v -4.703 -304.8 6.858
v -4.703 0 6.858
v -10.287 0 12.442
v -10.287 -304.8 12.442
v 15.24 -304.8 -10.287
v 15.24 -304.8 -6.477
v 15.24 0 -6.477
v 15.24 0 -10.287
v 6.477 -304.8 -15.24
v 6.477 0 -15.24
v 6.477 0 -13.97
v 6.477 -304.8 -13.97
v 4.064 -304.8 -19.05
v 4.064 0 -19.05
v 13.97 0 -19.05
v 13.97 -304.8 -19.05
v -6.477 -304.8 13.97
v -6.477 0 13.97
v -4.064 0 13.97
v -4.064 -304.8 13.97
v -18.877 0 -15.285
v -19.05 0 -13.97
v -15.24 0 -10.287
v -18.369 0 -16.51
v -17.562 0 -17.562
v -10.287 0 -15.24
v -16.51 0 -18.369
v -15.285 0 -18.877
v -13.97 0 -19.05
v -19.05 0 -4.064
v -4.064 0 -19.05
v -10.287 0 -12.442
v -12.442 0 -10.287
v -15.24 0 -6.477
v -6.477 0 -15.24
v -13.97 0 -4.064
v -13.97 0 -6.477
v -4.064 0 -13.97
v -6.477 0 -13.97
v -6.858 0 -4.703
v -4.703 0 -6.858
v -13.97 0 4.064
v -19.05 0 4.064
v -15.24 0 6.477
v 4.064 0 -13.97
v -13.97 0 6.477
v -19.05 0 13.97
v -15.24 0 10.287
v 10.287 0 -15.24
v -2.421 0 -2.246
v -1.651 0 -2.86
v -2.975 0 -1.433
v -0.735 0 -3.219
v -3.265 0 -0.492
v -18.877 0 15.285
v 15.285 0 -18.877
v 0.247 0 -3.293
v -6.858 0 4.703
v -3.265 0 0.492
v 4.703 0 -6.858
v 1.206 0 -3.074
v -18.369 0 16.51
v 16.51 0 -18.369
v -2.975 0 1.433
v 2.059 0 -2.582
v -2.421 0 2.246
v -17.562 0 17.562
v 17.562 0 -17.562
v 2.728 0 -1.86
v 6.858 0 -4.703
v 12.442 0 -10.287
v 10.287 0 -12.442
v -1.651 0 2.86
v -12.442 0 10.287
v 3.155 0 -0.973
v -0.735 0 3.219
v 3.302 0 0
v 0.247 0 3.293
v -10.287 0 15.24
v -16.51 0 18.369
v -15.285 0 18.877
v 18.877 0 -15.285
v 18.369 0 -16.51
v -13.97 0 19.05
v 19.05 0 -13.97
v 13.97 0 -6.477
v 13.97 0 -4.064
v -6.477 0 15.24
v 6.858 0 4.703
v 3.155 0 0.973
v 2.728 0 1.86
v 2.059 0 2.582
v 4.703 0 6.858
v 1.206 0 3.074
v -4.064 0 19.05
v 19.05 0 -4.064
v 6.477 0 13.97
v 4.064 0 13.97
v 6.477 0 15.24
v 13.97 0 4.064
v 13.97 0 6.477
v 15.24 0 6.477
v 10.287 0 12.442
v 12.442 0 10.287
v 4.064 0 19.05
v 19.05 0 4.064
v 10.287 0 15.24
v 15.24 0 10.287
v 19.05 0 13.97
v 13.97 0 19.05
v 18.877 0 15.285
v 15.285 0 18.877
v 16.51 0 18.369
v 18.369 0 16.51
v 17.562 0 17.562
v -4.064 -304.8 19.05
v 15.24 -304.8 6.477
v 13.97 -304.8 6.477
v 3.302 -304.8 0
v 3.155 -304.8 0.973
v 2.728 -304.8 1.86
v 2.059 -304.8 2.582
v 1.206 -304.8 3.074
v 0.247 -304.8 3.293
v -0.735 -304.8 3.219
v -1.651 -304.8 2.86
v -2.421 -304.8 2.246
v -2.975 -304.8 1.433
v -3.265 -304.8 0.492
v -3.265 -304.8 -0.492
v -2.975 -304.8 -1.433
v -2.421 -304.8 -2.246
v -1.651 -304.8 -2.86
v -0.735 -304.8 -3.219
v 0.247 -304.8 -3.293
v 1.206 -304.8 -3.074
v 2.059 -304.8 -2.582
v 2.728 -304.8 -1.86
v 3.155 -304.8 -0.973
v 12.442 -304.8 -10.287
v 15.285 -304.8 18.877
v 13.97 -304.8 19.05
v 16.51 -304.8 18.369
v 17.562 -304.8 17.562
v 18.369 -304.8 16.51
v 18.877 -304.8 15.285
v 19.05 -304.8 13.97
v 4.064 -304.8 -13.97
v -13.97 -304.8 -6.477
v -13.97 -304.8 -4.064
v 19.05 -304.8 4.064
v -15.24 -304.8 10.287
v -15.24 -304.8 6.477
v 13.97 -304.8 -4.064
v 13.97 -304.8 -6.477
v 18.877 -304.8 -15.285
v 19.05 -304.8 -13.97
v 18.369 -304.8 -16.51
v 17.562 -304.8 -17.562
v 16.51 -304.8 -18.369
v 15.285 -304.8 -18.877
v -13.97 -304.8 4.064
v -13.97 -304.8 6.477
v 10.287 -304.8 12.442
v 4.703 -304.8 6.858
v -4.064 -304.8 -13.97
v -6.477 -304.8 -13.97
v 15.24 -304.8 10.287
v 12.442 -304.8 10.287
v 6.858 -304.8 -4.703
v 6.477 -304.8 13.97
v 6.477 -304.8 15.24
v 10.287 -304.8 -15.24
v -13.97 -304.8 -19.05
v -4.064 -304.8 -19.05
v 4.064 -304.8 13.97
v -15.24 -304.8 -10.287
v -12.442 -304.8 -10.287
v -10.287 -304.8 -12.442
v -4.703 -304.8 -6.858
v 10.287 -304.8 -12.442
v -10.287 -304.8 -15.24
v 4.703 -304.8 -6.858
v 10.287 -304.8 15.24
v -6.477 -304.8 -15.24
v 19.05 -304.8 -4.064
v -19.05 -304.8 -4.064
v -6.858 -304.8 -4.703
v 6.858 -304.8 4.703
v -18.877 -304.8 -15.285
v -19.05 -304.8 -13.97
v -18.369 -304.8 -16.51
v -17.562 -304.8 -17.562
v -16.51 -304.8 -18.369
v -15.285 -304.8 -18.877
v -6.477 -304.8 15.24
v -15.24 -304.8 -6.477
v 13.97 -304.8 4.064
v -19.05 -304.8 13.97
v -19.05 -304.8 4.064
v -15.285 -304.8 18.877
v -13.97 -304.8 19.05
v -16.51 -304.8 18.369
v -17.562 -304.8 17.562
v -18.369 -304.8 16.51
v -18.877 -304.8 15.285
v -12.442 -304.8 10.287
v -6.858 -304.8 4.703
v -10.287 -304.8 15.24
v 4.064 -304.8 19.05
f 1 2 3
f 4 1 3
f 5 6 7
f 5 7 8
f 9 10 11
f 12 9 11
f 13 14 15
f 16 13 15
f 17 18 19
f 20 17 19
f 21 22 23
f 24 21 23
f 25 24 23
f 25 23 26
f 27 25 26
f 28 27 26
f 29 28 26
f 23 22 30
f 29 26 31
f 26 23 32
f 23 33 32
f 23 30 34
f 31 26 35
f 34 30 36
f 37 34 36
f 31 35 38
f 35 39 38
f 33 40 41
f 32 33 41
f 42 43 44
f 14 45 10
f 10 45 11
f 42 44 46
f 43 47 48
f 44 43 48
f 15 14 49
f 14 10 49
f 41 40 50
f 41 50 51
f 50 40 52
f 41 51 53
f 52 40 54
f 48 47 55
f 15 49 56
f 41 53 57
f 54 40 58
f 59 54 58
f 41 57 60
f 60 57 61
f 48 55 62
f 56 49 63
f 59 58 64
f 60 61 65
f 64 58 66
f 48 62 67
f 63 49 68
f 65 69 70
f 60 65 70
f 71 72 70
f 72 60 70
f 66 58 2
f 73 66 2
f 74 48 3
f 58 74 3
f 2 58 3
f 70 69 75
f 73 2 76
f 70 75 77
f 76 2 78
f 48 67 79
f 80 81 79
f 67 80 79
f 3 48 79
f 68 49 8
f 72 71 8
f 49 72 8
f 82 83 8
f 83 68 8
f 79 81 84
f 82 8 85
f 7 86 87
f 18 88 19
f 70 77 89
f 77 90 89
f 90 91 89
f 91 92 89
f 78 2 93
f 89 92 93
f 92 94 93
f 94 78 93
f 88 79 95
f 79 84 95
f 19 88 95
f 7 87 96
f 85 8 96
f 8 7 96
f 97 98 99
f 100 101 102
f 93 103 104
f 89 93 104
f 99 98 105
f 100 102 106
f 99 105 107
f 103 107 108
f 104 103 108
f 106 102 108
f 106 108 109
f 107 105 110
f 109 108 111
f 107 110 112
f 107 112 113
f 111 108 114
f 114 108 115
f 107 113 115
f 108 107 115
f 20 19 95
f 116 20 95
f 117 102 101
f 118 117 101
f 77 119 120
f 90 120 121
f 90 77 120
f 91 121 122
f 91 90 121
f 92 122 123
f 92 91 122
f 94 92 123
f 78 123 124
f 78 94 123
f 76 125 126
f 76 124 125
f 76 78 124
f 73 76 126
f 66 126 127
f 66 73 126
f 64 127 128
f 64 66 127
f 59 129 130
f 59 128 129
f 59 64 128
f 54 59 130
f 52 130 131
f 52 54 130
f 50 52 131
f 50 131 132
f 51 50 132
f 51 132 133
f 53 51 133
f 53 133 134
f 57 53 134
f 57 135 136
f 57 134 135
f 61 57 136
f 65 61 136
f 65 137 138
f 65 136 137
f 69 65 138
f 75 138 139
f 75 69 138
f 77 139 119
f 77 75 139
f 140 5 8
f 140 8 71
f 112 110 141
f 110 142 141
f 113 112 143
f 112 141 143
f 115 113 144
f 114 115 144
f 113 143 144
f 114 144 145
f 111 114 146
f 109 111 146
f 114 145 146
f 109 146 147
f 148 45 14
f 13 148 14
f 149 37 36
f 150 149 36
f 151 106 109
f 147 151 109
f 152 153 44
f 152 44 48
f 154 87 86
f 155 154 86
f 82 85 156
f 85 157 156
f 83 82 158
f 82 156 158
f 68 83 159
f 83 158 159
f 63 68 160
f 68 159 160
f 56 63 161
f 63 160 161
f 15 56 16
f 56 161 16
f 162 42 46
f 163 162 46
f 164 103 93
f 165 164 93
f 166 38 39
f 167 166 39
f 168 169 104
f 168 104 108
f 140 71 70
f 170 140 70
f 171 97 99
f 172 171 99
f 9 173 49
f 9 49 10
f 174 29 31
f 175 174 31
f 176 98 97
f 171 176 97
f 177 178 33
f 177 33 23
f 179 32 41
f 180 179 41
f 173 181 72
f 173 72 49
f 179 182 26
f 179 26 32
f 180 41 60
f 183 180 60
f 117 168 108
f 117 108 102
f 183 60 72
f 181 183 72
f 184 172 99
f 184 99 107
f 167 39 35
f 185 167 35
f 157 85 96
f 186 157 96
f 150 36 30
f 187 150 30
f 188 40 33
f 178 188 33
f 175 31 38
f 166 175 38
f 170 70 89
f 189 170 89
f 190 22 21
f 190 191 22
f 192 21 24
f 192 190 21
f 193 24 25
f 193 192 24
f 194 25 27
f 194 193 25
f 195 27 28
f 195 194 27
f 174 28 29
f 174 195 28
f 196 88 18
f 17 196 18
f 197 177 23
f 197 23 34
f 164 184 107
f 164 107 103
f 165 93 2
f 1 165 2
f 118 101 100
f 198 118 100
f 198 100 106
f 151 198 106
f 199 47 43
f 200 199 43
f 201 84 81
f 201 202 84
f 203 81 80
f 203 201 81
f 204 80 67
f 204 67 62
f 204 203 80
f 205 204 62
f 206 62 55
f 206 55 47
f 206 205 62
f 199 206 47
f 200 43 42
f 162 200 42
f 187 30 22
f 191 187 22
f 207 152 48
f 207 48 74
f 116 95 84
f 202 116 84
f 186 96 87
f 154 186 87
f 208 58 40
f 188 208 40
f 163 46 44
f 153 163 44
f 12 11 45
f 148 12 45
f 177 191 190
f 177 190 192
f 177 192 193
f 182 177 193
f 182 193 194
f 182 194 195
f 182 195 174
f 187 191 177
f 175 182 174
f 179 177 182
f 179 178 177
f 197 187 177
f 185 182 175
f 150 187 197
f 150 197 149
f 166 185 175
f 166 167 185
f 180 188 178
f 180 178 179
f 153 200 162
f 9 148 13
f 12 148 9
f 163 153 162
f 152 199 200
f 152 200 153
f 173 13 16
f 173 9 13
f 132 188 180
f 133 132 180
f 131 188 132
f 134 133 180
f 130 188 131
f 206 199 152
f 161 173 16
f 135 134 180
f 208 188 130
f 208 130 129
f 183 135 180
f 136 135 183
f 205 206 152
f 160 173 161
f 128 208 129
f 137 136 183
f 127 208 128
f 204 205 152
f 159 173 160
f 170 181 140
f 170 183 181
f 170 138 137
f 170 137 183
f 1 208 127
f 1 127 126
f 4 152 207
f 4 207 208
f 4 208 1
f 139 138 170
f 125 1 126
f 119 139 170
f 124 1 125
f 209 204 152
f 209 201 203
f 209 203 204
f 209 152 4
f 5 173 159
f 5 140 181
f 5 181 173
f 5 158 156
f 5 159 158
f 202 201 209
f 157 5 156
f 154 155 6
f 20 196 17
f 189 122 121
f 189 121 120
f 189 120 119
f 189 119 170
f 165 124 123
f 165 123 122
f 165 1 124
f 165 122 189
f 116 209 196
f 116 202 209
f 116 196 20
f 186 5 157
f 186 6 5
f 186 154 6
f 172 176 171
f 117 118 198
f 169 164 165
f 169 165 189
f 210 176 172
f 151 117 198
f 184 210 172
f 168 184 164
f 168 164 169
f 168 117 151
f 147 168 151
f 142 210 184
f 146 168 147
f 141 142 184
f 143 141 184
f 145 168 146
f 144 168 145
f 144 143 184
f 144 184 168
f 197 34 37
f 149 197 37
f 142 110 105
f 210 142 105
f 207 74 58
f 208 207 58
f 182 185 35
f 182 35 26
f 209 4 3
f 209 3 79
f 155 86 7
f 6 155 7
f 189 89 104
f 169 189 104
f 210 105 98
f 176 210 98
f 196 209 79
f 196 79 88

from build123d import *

# Parameters (mm, degrees)
F3_DEPTH = 304.8
F2_R     = 3.302
F4_DEPTH = 304.801
F5_R     = 5.08


with BuildPart() as f3:
    # F1 (on Front) → F3 (new body)
    with BuildSketch(Plane.XZ):
        Polygon((19.05, 19.05), (4.064, 19.05), (4.064, 13.97), (6.477, 13.97), (6.477, 15.24), (10.287, 15.24), (10.287, 13.97), (10.287, 12.442261), (4.702739, 6.858), (4.064, 6.858), (-4.064, 6.858), (-4.702739, 6.858), (-10.287, 12.442261), (-10.287, 13.97), (-10.287, 15.24), (-6.477, 15.24), (-6.477, 13.97), (-4.064, 13.97), (-4.064, 19.05), (-19.05, 19.05), (-19.05, 4.064), (-13.97, 4.064), (-13.97, 6.477), (-15.24, 6.477), (-15.24, 10.287), (-13.97, 10.287), (-12.442261, 10.287), (-6.858, 4.702739), (-6.858, 4.064), (-6.858, 0), (-6.858, -4.064), (-6.858, -4.702739), (-12.442261, -10.287), (-13.97, -10.287), (-15.24, -10.287), (-15.24, -6.477), (-13.97, -6.477), (-13.97, -4.064), (-19.05, -4.064), (-19.05, -19.05), (-4.064, -19.05), (-4.064, -13.97), (-6.477, -13.97), (-6.477, -15.24), (-10.287, -15.24), (-10.287, -13.97), (-10.287, -12.442261), (-4.702739, -6.858), (-4.064, -6.858), (0, -6.858), (4.064, -6.858), (4.702739, -6.858), (10.287, -12.442261), (10.287, -13.97), (10.287, -15.24), (6.477, -15.24), (6.477, -13.97), (4.064, -13.97), (4.064, -19.05), (19.05, -19.05), (19.05, -4.064), (13.97, -4.064), (13.97, -6.477), (15.24, -6.477), (15.24, -10.287), (13.97, -10.287), (12.442261, -10.287), (6.858, -4.702739), (6.858, -4.064), (6.858, 0), (6.858, 4.064), (6.858, 4.702739), (12.442261, 10.287), (13.97, 10.287), (15.24, 10.287), (15.24, 6.477), (13.97, 6.477), (13.97, 4.064), (19.05, 4.064), align=None)
    extrude(amount=F3_DEPTH)

    # F2 (on Front) → F4 (cut, through all)
    with BuildSketch(Plane.XZ):
        Circle(F2_R)
    extrude(amount=F4_DEPTH, mode=Mode.SUBTRACT)

    # F5
    f5_edges = [f3.edges().sort_by_distance(p)[0] for p in [
        (19.05, -152.4, 19.05),
        (-19.05, -152.4, 19.05),
        (19.05, -152.4, -19.05),
        (-19.05, -152.4, -19.05),
    ]]
    fillet(f5_edges, radius=F5_R)


solid = f3.part
